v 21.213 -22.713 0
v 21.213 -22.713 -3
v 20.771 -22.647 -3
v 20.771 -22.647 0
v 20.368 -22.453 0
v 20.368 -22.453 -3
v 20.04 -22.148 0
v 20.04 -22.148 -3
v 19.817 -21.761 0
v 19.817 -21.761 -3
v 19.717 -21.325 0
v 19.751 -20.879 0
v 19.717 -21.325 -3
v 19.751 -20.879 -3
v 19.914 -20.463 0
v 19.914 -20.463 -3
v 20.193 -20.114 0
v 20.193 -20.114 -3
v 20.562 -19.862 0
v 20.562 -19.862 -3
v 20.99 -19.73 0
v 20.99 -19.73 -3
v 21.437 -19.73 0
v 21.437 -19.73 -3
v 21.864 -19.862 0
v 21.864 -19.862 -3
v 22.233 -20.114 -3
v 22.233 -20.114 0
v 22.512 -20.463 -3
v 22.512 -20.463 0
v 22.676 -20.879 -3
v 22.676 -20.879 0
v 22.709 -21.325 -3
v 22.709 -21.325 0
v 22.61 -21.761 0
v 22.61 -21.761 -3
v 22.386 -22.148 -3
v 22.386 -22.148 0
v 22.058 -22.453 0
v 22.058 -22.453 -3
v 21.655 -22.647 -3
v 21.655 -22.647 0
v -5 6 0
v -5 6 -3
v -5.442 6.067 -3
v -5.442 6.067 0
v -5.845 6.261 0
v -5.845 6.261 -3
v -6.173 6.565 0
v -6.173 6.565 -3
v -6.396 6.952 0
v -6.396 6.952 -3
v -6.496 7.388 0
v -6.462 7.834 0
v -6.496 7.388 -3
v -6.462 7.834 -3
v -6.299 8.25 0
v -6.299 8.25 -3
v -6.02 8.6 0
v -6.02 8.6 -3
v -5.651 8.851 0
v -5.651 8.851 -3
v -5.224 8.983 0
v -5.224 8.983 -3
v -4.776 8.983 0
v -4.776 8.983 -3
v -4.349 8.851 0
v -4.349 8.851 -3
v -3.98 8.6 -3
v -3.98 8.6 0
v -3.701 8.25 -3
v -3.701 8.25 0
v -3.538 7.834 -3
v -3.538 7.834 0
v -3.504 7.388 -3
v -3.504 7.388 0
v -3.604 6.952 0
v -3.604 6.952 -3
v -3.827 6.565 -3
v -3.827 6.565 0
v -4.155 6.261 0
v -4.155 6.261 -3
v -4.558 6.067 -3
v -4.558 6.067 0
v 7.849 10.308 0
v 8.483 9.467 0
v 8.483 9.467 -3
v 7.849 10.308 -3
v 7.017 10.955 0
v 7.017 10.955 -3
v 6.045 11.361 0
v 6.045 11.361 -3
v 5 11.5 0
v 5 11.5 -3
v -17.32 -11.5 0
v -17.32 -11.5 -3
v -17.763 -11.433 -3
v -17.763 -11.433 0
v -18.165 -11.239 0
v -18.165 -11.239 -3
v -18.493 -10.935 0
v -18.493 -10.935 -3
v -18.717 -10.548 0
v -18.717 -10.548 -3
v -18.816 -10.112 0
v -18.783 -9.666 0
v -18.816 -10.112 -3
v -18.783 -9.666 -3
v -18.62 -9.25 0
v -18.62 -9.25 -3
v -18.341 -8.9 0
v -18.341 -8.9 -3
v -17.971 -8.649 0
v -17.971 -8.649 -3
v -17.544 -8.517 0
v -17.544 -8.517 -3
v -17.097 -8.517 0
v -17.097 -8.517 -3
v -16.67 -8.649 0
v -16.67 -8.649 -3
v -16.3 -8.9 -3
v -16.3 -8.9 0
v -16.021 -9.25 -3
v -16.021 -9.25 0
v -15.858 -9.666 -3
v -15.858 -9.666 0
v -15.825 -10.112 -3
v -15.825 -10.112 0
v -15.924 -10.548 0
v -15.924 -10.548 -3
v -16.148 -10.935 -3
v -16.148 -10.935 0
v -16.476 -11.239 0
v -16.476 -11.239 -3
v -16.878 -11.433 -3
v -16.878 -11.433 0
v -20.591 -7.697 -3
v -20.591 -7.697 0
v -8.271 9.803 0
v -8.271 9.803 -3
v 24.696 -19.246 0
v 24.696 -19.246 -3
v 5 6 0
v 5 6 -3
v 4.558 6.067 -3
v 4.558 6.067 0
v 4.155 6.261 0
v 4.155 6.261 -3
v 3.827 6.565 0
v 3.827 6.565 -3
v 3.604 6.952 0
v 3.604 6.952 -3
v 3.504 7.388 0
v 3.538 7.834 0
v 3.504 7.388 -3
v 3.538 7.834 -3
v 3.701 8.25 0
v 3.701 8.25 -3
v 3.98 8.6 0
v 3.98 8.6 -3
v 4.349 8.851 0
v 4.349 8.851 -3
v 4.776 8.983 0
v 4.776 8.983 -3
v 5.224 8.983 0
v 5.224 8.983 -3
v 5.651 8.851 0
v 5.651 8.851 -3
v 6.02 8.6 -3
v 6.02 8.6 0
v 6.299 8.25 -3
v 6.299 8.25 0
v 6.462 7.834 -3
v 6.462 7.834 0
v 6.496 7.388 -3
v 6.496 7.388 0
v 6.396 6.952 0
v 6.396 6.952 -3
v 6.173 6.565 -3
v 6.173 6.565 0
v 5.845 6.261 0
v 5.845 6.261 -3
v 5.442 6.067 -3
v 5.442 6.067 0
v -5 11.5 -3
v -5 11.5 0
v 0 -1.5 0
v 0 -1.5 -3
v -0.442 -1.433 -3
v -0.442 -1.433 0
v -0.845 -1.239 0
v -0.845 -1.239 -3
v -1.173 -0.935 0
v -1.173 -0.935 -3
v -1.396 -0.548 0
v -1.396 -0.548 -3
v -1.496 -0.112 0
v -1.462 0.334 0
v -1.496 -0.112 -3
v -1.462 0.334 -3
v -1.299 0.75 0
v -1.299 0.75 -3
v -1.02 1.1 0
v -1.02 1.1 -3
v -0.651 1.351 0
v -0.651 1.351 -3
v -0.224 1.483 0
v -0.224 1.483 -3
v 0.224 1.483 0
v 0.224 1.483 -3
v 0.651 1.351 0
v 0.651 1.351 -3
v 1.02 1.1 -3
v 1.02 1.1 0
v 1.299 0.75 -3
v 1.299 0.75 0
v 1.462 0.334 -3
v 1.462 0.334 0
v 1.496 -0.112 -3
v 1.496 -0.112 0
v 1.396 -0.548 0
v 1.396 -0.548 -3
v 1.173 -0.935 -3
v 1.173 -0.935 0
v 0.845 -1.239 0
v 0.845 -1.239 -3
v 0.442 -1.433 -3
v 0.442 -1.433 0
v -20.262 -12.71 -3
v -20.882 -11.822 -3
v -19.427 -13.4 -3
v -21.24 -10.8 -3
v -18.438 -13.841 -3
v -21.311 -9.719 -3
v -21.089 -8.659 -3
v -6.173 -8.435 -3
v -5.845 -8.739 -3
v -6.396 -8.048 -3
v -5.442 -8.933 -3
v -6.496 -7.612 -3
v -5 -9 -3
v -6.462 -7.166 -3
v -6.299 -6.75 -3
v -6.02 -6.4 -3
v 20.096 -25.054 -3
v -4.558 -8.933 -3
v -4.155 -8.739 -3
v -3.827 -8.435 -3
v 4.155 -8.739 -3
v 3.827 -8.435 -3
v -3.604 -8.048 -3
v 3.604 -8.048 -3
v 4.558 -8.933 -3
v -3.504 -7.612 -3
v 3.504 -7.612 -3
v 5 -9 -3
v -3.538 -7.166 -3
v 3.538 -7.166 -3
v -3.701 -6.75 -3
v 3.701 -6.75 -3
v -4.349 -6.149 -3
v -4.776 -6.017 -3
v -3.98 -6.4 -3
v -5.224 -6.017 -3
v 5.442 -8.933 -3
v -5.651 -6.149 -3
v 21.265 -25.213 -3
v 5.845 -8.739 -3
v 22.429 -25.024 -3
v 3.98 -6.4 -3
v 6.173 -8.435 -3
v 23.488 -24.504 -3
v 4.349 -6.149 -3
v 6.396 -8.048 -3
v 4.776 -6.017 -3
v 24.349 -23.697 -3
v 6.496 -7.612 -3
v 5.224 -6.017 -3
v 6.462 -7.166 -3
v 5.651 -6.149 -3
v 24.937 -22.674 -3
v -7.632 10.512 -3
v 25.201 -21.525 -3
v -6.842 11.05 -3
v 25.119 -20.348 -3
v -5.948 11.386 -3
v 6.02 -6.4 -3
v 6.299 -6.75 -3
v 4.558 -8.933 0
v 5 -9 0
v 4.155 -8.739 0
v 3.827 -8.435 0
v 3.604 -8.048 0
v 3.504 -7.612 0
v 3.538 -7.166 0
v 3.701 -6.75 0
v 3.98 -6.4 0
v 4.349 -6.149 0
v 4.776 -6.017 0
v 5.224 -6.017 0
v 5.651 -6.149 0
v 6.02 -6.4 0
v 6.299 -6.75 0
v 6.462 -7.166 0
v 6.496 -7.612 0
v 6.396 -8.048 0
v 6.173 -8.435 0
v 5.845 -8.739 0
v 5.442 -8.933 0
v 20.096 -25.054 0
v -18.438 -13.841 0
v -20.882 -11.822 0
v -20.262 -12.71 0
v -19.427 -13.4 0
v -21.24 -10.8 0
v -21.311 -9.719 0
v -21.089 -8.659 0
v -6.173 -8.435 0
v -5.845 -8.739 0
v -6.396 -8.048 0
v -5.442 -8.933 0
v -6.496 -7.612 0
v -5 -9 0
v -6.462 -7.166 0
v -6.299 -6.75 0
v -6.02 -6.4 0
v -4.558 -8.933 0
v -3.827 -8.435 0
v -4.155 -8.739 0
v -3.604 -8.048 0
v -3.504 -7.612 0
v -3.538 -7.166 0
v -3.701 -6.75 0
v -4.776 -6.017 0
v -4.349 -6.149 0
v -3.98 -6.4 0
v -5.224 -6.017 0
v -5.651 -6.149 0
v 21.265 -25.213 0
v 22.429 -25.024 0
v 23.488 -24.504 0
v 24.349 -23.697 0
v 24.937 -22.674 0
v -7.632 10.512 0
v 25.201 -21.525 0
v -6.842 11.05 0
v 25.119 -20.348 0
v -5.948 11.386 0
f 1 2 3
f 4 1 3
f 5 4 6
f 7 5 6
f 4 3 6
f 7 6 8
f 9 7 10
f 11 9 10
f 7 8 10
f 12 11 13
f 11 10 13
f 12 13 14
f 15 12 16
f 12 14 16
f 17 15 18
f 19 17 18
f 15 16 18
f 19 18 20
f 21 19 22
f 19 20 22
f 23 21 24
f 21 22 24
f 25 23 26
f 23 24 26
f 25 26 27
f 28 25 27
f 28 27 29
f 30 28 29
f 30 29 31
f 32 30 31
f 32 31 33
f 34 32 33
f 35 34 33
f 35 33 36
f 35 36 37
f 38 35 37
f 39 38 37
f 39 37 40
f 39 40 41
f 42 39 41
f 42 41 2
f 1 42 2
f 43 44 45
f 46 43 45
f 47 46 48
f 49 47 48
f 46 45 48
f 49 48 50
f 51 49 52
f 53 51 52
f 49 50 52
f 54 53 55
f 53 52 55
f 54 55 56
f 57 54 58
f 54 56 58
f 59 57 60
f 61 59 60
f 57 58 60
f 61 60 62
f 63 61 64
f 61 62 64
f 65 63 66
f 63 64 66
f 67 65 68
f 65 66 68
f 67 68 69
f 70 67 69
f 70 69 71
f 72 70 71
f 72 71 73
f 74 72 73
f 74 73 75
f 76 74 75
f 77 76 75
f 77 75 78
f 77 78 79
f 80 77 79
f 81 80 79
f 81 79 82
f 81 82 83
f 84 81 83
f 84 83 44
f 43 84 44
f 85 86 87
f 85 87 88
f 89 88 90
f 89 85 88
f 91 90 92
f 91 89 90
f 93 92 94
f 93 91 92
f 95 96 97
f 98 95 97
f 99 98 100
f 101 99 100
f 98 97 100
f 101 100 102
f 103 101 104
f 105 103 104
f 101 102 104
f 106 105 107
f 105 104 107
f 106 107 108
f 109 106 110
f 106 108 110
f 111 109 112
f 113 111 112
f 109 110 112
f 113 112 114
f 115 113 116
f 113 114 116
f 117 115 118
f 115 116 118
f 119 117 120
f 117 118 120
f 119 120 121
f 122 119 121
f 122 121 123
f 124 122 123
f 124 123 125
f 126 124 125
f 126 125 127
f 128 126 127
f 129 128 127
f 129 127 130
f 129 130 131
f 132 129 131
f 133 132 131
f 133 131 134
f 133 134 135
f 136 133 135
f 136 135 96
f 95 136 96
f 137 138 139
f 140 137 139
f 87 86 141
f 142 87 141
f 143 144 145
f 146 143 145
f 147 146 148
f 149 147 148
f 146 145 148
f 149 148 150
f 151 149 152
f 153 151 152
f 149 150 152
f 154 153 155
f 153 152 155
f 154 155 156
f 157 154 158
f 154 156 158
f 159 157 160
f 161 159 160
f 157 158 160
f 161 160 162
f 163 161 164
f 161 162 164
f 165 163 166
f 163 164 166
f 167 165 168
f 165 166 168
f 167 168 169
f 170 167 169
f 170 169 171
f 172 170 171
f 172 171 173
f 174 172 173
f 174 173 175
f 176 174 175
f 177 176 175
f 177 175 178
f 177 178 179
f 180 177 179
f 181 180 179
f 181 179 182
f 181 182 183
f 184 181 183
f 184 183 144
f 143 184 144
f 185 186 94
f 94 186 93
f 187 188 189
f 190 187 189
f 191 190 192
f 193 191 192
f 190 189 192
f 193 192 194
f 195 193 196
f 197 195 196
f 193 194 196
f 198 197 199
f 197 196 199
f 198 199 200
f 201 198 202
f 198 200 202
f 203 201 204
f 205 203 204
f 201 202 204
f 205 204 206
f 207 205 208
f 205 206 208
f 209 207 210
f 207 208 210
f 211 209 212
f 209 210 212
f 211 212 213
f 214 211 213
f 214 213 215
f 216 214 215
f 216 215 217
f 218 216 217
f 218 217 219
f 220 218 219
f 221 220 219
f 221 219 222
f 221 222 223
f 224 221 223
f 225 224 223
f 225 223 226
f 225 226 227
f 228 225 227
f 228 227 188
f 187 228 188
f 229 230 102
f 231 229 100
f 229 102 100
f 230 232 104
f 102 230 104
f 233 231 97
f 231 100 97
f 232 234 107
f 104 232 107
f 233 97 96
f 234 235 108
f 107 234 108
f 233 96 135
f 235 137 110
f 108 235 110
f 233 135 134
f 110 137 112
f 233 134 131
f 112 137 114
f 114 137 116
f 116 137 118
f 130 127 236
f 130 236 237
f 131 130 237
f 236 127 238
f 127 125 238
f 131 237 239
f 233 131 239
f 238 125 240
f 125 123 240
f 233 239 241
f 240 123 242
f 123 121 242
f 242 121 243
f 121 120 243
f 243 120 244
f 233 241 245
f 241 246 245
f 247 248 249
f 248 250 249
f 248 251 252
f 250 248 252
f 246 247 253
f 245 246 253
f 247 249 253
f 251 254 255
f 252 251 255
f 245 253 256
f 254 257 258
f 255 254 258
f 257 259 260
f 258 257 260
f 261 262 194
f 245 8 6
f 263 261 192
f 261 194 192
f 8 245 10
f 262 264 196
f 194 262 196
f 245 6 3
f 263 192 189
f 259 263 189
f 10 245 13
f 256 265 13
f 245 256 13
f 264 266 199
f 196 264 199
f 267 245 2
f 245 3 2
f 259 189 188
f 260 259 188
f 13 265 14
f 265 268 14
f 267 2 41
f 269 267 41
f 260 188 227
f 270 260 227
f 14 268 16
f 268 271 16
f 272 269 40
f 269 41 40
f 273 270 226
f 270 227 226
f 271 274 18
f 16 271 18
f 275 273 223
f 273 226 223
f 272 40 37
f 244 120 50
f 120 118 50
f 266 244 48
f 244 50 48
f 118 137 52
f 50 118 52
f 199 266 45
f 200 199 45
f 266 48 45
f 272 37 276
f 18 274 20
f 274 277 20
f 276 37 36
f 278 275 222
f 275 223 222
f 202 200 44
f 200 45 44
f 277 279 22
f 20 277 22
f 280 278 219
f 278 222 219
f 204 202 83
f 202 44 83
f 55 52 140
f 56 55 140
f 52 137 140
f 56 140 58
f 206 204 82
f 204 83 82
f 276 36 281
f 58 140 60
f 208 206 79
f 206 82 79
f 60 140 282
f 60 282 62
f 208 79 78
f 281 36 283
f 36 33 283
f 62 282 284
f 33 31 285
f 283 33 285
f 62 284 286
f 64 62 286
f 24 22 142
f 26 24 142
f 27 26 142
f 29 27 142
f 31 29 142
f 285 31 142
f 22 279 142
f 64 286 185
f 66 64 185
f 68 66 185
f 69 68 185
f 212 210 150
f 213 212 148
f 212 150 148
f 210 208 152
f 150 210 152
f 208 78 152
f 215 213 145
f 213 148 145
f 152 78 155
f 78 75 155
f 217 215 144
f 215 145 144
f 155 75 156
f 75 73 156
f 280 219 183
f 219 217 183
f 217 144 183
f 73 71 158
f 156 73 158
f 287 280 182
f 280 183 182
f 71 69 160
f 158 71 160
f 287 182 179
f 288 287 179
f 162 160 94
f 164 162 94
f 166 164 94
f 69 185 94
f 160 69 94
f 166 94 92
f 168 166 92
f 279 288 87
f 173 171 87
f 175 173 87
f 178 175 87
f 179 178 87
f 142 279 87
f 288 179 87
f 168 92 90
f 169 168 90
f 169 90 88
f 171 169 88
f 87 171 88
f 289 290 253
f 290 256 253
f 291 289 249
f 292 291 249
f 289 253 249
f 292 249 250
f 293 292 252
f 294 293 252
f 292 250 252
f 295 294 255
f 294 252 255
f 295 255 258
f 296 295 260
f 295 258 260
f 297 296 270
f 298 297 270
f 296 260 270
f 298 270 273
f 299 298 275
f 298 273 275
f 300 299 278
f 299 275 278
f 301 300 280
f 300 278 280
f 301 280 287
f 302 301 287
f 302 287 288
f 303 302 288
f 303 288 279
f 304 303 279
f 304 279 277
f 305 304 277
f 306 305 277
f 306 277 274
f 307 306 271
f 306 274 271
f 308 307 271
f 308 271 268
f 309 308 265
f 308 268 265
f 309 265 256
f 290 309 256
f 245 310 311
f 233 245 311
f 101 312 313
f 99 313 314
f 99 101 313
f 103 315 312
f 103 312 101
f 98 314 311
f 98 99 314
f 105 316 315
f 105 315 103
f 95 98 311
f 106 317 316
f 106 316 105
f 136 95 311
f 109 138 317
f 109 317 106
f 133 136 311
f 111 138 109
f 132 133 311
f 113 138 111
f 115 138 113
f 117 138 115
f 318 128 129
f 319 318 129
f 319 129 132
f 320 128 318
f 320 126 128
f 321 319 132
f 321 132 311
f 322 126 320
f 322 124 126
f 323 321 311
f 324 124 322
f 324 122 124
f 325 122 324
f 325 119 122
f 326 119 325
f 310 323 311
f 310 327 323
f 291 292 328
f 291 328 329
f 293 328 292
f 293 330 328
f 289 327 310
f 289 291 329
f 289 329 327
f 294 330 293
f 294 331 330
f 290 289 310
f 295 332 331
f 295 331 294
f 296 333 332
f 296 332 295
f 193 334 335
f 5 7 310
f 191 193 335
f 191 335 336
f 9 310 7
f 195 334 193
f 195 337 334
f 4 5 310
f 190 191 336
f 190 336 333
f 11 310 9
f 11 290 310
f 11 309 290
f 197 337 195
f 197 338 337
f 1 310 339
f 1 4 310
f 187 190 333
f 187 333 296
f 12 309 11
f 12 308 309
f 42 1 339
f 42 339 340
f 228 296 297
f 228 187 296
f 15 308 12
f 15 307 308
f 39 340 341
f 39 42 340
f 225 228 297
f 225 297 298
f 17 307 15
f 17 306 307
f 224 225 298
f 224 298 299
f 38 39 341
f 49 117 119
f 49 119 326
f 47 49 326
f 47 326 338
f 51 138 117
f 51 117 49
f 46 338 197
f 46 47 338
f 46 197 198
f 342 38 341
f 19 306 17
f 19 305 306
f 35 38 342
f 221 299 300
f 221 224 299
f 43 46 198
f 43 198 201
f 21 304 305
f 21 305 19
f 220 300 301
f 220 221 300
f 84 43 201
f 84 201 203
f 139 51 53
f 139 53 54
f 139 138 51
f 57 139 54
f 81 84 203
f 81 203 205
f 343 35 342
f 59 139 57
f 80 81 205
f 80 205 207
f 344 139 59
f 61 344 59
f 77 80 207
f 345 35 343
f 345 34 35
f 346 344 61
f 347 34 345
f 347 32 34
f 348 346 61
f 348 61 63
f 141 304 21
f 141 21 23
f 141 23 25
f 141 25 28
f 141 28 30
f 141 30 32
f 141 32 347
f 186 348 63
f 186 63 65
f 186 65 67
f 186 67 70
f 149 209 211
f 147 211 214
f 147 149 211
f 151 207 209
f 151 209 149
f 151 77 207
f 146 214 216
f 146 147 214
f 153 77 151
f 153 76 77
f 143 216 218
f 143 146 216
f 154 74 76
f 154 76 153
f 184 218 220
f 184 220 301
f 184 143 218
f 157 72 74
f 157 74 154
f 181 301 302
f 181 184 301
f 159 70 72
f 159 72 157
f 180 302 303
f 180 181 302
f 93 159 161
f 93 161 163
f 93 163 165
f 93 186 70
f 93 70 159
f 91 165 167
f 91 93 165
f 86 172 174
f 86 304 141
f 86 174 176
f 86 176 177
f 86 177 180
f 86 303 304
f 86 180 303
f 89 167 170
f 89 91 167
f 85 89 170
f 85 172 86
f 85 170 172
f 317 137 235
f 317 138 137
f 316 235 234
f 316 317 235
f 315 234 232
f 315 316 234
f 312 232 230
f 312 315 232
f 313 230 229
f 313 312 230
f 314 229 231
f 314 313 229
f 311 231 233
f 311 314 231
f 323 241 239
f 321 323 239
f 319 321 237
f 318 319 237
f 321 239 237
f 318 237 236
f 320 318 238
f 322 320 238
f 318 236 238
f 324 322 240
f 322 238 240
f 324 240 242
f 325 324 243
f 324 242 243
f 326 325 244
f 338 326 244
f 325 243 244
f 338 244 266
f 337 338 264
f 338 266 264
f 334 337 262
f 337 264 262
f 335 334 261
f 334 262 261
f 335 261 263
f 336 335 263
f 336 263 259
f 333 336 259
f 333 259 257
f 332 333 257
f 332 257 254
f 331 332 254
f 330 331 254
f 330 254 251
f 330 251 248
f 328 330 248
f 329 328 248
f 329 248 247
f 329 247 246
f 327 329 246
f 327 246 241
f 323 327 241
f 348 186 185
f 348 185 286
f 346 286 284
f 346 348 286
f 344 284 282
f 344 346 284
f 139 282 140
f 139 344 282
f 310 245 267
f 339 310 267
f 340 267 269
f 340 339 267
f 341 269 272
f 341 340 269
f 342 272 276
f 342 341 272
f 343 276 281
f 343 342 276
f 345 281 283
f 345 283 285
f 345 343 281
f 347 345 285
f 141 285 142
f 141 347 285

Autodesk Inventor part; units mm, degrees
ref_plane "YZ Plane" through (0, 0, 0) normal (1, 0, 0) x (0, 1, 0)
ref_plane "XZ Plane" through (0, 0, 0) normal (0, 1, 0) x (-1, 0, 0)
ref_plane "XY Plane" through (0, 0, 0) normal (0, 0, 1) x (1, 0, 0)
sketch "Sketch1" plane through (0, 0, 0) normal (0, 0, 1) x (1, 0, 0)
  line L0 (5, -7.5) -> (-5, -7.5) construction
  line L1 (-5, -7.5) -> (-5, 7.5) construction
  line L2 (-5, 7.5) -> (5, 7.5) construction
  line L3 (5, 7.5) -> (5, -7.5) construction
  line L4 (5, -7.5) -> (-5, 7.5) construction
  line L5 (-5, -7.5) -> (5, 7.5) construction
  line L6 (0, 0) -> (21.2132, -21.2132) construction
  line L7 (0, 0) -> (-17.3205, -10) construction
  line L8 (-20.5912, -7.6973) -> (-8.2707, 9.8027)
  arc A0 (-5, 11.5) -> (-8.2707, 9.8027) centre (-5, 7.5) ccw
  line L9 (-5, 11.5) -> (5, 11.5)
  arc A1 (8.4831, 9.4668) -> (5, 11.5) centre (5, 7.5) ccw
  line L10 (8.4831, 9.4668) -> (24.6963, -19.2464)
  arc A2 (20.0956, -25.0539) -> (24.6963, -19.2464) centre (21.2132, -21.2132) ccw
  line L11 (20.0956, -25.0539) -> (-18.4381, -13.8407)
  arc A3 (-20.5912, -7.6973) -> (-18.4381, -13.8407) centre (-17.3205, -10) ccw
  dimension "d0" = 10
  dimension "d1" = 15
  dimension "d2" = 30
  dimension "d4" = 45
  dimension "d5" = 30
  dimension "d6" = 20
  dimension "d7" = 4
extrude "Extrusion1" add sketch "Sketch1" against normal blind 3
hole "Hole1" at (-5, 7.5, 0) at (5, 7.5, 0) at (5, -7.5, 0) at (-5, -7.5, 0) direction (0, 0, -1) diameter 3 depth 8 tip angle 118
hole "Hole2" at (-17.3205, -10, 0) at (21.2132, -21.2132, 0) direction (0, 0, -1) diameter 3 depth 8 tip angle 118
hole "Hole3" at (0, 0, 0) direction (0, 0, -1) diameter 3 depth 8 tip angle 118
properties part number "LegBase_front"
